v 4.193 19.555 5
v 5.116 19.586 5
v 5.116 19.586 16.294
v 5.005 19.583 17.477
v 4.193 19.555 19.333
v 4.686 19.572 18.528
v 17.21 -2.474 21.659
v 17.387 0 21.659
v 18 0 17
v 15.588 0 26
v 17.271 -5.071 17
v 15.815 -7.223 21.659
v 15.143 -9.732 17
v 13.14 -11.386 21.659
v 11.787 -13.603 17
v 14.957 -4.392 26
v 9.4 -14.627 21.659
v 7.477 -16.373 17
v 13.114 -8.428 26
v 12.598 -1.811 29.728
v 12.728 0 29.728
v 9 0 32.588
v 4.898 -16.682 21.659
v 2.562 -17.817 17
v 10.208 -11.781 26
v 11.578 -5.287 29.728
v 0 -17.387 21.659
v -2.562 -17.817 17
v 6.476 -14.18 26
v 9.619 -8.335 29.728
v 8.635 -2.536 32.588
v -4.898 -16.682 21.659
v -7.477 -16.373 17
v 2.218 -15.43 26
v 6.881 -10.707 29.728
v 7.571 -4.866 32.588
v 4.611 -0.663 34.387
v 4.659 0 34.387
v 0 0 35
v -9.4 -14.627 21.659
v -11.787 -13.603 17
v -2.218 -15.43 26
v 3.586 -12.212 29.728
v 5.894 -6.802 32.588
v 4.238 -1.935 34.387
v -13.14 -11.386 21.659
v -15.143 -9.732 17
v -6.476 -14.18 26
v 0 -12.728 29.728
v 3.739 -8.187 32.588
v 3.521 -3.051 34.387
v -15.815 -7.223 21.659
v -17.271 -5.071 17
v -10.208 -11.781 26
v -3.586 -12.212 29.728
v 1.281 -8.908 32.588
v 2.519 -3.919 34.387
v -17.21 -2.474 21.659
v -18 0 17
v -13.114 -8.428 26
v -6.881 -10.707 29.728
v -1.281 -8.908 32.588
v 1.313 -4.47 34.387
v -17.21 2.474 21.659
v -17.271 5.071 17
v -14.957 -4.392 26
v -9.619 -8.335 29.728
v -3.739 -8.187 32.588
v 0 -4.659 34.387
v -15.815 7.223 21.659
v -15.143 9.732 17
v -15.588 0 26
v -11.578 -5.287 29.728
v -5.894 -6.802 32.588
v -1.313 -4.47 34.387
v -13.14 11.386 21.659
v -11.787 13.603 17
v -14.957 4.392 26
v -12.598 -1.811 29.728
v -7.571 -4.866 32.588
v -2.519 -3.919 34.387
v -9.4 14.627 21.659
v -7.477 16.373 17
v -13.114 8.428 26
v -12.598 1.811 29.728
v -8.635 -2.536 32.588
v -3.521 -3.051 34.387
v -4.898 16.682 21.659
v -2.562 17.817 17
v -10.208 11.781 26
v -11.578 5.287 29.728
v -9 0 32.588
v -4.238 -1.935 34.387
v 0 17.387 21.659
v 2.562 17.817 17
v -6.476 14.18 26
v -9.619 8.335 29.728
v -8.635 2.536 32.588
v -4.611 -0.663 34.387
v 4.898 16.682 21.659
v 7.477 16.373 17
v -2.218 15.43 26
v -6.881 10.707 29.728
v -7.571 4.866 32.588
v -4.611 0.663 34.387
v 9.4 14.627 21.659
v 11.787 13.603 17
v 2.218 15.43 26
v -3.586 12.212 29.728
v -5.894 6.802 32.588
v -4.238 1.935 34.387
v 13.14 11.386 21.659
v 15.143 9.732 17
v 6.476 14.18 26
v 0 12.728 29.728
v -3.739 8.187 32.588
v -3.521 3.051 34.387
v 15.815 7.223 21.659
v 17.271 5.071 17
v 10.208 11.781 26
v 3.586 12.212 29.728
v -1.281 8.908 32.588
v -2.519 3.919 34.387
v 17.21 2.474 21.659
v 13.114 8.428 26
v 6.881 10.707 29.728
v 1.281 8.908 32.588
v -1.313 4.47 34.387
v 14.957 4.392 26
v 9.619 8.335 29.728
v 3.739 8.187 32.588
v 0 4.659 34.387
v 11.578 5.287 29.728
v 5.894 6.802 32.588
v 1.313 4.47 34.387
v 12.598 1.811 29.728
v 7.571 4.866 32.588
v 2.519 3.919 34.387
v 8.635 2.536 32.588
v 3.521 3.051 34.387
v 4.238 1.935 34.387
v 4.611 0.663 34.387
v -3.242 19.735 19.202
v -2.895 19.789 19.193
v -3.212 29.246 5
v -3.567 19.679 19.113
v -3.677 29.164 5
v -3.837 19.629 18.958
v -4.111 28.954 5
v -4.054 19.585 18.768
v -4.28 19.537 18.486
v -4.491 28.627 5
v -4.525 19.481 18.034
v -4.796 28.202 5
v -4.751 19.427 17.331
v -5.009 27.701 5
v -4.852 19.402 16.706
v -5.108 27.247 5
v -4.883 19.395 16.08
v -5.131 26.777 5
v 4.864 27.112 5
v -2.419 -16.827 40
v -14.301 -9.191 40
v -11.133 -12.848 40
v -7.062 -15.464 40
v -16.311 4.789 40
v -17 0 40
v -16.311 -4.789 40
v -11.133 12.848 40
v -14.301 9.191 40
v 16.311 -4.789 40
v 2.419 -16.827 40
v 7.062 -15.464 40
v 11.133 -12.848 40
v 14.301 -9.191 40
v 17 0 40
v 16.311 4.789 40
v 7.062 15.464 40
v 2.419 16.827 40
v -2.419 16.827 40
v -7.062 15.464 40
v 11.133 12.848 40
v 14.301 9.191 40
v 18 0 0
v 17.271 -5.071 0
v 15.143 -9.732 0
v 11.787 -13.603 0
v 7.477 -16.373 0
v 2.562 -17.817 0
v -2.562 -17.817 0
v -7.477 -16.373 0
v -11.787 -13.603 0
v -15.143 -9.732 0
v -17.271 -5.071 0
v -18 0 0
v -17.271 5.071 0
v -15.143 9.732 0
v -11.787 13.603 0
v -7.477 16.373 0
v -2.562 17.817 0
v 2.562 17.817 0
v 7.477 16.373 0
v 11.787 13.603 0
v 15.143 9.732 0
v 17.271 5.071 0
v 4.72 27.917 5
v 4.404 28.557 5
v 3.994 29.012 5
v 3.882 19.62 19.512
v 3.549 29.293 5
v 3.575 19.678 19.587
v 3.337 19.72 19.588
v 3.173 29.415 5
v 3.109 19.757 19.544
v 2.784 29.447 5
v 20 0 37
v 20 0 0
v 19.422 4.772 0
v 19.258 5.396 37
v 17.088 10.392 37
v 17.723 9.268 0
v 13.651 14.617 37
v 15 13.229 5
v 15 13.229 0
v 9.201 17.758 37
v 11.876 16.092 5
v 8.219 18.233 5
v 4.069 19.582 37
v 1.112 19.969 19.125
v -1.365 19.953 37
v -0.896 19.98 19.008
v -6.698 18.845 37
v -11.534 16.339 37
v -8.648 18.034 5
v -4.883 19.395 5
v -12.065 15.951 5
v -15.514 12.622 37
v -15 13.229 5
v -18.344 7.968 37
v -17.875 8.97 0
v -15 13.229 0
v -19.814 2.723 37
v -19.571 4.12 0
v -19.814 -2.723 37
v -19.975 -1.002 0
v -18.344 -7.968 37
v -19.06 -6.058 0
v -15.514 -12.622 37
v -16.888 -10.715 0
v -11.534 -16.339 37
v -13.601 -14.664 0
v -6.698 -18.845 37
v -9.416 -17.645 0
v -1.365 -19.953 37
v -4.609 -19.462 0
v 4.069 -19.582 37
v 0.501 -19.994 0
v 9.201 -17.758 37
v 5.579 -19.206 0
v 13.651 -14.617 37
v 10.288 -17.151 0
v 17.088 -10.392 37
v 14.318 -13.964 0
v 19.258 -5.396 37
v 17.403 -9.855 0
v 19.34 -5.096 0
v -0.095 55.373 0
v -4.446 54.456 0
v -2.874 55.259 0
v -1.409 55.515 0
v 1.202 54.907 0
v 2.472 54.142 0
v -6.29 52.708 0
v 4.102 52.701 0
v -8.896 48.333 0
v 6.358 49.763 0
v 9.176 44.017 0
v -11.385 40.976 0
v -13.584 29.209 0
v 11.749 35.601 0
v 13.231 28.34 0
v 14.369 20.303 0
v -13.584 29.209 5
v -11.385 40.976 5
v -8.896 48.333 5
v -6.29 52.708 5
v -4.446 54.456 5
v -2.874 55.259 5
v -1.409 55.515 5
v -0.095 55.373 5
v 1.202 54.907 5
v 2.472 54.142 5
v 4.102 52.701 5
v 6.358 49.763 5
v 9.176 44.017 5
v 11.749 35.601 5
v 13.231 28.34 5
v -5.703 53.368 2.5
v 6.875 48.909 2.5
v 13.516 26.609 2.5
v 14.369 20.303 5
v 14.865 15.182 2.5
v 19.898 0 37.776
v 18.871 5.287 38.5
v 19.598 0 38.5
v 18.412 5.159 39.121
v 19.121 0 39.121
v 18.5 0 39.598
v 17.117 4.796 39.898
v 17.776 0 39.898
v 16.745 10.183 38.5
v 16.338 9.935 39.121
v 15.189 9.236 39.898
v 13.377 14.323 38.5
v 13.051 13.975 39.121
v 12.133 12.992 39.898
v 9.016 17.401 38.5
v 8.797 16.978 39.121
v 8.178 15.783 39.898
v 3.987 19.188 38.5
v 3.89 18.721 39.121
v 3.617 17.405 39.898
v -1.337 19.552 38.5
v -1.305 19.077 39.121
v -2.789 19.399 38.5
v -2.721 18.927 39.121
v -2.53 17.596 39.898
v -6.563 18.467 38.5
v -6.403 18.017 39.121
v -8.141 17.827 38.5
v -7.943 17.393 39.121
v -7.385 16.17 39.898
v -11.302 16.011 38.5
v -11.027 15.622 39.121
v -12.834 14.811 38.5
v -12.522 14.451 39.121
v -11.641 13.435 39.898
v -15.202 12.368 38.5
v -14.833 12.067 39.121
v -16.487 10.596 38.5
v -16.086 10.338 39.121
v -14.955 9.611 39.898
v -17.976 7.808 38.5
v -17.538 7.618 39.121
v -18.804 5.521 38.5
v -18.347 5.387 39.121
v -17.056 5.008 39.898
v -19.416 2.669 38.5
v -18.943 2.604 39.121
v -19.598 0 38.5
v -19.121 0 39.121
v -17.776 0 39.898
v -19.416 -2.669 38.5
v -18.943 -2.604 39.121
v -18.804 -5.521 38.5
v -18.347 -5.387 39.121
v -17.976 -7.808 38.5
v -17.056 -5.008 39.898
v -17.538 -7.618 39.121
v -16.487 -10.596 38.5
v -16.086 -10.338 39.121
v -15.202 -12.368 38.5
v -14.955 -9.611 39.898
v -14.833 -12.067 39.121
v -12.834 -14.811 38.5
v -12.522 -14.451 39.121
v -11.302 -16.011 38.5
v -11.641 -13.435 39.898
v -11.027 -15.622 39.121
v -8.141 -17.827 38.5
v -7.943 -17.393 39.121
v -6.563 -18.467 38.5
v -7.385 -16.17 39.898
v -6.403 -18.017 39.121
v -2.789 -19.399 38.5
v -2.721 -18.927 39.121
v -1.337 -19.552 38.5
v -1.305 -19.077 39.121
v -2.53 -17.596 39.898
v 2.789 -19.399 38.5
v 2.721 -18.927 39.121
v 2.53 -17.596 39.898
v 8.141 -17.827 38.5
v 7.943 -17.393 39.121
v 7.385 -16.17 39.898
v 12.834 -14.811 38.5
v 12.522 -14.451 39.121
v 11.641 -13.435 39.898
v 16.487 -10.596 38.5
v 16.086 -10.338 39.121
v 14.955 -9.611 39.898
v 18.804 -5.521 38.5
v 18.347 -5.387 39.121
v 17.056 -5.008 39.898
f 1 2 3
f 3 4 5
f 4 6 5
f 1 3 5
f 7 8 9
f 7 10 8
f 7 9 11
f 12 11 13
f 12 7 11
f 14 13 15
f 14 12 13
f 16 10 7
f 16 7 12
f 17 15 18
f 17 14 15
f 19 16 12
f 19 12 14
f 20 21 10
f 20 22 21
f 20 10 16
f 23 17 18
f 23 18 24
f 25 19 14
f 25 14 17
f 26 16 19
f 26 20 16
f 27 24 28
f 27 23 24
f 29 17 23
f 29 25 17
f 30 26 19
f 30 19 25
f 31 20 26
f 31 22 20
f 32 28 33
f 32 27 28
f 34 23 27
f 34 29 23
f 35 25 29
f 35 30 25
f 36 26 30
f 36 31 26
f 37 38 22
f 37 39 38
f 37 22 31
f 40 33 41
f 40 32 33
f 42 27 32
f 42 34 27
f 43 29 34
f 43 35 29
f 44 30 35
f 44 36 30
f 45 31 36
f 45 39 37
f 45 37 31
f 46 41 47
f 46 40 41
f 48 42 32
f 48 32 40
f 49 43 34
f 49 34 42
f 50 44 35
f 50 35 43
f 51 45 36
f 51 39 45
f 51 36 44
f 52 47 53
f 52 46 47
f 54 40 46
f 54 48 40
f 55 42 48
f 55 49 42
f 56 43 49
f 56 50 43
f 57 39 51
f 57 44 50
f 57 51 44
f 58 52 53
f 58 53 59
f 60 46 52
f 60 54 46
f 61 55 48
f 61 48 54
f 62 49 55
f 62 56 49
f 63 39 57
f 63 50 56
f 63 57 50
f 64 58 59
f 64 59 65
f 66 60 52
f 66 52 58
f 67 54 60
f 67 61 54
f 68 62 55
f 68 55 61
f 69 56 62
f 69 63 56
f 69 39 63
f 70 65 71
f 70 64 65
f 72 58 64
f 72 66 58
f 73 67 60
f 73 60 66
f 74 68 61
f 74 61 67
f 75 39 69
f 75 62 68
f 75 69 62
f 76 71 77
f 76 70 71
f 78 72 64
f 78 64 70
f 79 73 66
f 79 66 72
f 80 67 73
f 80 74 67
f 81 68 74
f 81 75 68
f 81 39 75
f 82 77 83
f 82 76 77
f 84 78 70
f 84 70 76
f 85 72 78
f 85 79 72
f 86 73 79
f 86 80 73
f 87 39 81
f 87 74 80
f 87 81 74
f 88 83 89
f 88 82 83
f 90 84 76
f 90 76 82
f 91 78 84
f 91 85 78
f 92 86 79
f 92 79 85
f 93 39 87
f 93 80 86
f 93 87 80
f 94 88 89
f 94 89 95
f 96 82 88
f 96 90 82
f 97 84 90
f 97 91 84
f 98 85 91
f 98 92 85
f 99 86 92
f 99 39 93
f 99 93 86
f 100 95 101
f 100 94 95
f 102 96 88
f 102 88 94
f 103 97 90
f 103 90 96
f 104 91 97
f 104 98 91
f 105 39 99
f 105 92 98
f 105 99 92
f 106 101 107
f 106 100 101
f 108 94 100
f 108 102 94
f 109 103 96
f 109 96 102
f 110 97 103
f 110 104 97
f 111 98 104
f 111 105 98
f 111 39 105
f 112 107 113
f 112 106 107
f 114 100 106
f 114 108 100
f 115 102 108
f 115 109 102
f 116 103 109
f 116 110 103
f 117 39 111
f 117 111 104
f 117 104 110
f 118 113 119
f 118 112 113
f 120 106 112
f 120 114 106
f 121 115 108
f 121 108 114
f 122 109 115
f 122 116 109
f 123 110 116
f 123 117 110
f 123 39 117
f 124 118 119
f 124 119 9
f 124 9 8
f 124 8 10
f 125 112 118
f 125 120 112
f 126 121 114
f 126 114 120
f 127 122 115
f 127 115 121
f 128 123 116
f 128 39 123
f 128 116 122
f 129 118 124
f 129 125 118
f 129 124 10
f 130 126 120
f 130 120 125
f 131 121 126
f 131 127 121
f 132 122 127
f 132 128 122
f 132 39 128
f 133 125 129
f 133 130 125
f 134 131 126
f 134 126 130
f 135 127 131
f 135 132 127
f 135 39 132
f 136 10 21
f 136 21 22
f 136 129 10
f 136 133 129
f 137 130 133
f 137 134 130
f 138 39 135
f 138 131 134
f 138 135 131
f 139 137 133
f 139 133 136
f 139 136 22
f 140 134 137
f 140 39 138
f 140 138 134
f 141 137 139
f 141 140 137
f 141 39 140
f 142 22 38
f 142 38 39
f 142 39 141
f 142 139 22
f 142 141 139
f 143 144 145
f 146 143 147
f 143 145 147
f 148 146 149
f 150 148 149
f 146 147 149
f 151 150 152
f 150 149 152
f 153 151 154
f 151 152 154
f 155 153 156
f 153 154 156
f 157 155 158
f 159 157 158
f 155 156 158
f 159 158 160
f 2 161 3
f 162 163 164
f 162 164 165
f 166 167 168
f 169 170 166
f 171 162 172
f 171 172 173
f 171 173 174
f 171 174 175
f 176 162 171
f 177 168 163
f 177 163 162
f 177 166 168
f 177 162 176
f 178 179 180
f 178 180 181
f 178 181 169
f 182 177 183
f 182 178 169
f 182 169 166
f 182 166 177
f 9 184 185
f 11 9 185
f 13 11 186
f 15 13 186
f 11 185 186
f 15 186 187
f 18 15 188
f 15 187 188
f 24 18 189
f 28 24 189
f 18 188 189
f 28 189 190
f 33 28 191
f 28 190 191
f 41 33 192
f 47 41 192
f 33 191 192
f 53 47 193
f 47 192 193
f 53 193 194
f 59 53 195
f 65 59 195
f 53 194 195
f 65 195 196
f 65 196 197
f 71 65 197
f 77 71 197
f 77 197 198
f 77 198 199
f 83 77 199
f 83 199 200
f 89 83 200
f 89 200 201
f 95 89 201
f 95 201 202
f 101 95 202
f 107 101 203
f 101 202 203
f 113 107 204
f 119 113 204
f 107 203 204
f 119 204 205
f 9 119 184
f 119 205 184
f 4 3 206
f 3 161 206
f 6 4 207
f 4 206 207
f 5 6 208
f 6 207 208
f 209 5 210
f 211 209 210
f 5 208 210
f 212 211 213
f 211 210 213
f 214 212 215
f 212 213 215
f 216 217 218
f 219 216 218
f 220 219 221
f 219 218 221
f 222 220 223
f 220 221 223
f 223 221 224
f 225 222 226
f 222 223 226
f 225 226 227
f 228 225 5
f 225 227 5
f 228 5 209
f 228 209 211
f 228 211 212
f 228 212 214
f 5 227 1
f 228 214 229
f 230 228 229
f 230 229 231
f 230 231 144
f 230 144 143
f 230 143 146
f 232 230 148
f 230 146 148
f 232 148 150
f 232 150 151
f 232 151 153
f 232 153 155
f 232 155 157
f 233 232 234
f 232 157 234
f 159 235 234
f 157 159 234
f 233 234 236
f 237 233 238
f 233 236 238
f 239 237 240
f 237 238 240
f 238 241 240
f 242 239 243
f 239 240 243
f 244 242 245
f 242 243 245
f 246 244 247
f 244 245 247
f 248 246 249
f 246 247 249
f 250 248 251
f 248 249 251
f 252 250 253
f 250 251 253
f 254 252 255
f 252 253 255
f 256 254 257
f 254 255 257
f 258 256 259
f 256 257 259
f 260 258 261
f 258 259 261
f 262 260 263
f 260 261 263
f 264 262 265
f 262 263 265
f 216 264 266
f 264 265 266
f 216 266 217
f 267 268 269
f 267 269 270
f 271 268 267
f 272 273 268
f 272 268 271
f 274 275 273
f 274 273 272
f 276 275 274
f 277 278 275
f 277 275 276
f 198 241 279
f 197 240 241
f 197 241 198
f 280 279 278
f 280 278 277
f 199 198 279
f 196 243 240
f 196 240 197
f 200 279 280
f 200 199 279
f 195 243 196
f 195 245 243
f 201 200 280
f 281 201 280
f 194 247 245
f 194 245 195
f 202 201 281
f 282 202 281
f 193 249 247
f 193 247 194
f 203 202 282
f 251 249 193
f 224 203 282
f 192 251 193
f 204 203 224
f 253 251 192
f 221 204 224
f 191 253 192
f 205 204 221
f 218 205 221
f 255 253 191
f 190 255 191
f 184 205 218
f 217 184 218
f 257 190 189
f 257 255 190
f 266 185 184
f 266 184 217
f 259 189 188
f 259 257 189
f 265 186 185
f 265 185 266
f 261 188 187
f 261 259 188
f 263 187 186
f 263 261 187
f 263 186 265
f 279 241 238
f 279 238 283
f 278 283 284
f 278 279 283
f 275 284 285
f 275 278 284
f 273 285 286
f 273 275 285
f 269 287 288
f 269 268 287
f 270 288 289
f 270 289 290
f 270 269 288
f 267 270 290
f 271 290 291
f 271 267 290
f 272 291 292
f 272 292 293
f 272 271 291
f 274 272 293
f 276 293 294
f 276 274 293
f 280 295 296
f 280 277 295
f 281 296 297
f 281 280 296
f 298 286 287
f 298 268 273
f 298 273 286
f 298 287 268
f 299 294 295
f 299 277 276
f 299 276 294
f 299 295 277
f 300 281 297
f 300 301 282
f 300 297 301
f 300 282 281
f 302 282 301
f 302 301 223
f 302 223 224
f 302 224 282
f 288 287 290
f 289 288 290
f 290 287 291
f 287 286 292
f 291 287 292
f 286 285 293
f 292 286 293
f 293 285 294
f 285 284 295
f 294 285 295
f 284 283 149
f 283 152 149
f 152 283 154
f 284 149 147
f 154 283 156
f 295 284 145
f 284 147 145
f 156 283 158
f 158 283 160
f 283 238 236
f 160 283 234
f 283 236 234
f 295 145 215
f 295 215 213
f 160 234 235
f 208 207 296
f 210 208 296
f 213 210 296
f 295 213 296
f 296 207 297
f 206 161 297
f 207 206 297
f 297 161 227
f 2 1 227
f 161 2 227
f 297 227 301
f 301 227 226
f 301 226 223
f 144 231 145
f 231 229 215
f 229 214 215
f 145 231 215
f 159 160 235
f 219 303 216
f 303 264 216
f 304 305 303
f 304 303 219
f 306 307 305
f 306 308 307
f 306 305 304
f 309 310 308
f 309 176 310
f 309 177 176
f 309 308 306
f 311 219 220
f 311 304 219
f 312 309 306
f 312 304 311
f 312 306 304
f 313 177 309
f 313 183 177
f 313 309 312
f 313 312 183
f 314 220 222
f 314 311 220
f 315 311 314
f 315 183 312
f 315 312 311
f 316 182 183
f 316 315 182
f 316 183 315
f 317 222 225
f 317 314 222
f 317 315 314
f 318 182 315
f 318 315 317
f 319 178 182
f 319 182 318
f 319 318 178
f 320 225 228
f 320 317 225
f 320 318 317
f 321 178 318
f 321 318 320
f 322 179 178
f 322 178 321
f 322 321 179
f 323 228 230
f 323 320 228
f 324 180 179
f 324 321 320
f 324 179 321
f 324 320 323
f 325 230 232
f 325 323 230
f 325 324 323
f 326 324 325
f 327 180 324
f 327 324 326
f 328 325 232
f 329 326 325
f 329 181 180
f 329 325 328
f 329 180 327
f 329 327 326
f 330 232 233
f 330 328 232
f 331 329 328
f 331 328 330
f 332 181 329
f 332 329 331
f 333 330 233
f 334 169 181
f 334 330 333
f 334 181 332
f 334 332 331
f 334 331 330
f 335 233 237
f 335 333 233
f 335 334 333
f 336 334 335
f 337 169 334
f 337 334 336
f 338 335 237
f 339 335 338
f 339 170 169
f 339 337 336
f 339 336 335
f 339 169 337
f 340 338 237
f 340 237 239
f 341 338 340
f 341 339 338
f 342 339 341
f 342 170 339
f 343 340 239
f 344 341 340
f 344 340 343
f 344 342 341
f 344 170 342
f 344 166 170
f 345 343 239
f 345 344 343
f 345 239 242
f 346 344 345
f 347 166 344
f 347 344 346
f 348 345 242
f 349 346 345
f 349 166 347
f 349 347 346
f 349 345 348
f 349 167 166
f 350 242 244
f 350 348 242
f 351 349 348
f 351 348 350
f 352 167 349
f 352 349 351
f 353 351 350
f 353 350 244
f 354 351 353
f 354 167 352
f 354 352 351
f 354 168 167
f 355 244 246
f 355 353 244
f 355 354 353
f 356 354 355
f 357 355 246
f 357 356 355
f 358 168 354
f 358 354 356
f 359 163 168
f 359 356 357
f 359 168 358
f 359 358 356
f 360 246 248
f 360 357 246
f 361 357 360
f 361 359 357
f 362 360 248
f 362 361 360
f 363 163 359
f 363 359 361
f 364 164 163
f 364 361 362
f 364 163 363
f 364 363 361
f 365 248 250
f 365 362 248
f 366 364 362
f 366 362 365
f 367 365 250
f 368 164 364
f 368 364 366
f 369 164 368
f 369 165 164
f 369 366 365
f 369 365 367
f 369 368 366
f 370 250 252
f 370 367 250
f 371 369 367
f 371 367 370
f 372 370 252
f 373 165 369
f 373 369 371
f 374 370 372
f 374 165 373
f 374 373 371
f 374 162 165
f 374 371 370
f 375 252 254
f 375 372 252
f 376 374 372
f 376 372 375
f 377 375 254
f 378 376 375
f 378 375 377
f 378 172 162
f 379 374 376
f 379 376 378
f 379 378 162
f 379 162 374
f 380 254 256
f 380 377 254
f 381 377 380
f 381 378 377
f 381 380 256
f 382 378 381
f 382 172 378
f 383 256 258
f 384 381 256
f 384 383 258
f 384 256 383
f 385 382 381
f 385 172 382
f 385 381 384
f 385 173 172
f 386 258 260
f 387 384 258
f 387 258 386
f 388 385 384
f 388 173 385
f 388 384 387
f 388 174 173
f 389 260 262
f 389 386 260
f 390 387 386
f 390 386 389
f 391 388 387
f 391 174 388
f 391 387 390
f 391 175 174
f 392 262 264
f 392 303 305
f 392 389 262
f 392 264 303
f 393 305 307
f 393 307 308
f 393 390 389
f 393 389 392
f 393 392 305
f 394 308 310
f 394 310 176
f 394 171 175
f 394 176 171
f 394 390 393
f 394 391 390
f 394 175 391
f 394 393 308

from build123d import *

# Parameters (mm, degrees)
SKETCH_R     = 20
PAD_DEPTH    = 40
SKETCH001_R  = 18
POCKET_DEPTH = 35
FILLET_R     = 18
FILLET001_R  = 3
PAD001_DEPTH = 5
PAD002_DEPTH = 5
FILLET002_R  = 2


with BuildPart() as part:
    # Sketch → Pad (new body)
    with BuildSketch(Plane.XY):
        Circle(SKETCH_R)
    extrude(amount=PAD_DEPTH)

    # Sketch001 (on Face2 of Pad) → Pocket (cut)
    with BuildSketch(Plane(origin=(0, 0, 0), x_dir=(1, 0, 0), z_dir=(0, 0, -1))):
        Circle(SKETCH001_R)
    extrude(amount=-POCKET_DEPTH, mode=Mode.SUBTRACT)

    # Fillet
    fillet_edges = [part.edges().sort_by_distance(p)[0] for p in [
        (-18, 0, 35),
    ]]
    fillet(fillet_edges, radius=FILLET_R)

    # Fillet001
    fillet001_edges = [part.edges().sort_by_distance(p)[0] for p in [
        (-20, 0, 40),
    ]]
    fillet(fillet001_edges, radius=FILLET001_R)

    # Sketch002 (on Face3 of Fillet001) → Pad001 (join)
    with BuildSketch(Plane(origin=(0, 0, 0), x_dir=(1, 0, 0), z_dir=(0, 0, -1))):
        with BuildLine():
            add(Edge.make_bspline(
                [(-15, -13.228757), (-12.5, -60.801779), (12.5, -60.801779), (15, -13.228757), (15, -13.228757)],
                knots=[0, 0, 0, 0, 0.5, 1, 1, 1, 1], degree=3))
            Line((15, -13.228757), (9.755599, -16.368215))
            Line((9.755599, -16.368215), (2.922141, -18.626266))
            Line((2.922141, -18.626266), (-4.636806, -18.626266))
            Line((-4.636806, -18.626266), (-15, -13.228757))
        make_face()
    extrude(amount=-PAD001_DEPTH)

    # Sketch003 (on DatumPlane) → Pad002 (join, symmetric)
    with BuildSketch(Plane(origin=(-0.443704, 36.200309, 2.5), x_dir=(0, 0, -1), z_dir=(0.999439, 0.033491, 0))):
        Polygon((-2.4, -16.790791), (-17.4, -16.790791), (-2.4, -6.790791), align=None)
    extrude(amount=PAD002_DEPTH, both=True)

    # Fillet002
    fillet002_edges = [part.edges().sort_by_distance(p)[0] for p in [
        (-5.047294, 24.286952, 12.342556),
        (4.949495, 24.550274, 12.45),
    ]]
    fillet(fillet002_edges, radius=FILLET002_R)


solid = part.part
